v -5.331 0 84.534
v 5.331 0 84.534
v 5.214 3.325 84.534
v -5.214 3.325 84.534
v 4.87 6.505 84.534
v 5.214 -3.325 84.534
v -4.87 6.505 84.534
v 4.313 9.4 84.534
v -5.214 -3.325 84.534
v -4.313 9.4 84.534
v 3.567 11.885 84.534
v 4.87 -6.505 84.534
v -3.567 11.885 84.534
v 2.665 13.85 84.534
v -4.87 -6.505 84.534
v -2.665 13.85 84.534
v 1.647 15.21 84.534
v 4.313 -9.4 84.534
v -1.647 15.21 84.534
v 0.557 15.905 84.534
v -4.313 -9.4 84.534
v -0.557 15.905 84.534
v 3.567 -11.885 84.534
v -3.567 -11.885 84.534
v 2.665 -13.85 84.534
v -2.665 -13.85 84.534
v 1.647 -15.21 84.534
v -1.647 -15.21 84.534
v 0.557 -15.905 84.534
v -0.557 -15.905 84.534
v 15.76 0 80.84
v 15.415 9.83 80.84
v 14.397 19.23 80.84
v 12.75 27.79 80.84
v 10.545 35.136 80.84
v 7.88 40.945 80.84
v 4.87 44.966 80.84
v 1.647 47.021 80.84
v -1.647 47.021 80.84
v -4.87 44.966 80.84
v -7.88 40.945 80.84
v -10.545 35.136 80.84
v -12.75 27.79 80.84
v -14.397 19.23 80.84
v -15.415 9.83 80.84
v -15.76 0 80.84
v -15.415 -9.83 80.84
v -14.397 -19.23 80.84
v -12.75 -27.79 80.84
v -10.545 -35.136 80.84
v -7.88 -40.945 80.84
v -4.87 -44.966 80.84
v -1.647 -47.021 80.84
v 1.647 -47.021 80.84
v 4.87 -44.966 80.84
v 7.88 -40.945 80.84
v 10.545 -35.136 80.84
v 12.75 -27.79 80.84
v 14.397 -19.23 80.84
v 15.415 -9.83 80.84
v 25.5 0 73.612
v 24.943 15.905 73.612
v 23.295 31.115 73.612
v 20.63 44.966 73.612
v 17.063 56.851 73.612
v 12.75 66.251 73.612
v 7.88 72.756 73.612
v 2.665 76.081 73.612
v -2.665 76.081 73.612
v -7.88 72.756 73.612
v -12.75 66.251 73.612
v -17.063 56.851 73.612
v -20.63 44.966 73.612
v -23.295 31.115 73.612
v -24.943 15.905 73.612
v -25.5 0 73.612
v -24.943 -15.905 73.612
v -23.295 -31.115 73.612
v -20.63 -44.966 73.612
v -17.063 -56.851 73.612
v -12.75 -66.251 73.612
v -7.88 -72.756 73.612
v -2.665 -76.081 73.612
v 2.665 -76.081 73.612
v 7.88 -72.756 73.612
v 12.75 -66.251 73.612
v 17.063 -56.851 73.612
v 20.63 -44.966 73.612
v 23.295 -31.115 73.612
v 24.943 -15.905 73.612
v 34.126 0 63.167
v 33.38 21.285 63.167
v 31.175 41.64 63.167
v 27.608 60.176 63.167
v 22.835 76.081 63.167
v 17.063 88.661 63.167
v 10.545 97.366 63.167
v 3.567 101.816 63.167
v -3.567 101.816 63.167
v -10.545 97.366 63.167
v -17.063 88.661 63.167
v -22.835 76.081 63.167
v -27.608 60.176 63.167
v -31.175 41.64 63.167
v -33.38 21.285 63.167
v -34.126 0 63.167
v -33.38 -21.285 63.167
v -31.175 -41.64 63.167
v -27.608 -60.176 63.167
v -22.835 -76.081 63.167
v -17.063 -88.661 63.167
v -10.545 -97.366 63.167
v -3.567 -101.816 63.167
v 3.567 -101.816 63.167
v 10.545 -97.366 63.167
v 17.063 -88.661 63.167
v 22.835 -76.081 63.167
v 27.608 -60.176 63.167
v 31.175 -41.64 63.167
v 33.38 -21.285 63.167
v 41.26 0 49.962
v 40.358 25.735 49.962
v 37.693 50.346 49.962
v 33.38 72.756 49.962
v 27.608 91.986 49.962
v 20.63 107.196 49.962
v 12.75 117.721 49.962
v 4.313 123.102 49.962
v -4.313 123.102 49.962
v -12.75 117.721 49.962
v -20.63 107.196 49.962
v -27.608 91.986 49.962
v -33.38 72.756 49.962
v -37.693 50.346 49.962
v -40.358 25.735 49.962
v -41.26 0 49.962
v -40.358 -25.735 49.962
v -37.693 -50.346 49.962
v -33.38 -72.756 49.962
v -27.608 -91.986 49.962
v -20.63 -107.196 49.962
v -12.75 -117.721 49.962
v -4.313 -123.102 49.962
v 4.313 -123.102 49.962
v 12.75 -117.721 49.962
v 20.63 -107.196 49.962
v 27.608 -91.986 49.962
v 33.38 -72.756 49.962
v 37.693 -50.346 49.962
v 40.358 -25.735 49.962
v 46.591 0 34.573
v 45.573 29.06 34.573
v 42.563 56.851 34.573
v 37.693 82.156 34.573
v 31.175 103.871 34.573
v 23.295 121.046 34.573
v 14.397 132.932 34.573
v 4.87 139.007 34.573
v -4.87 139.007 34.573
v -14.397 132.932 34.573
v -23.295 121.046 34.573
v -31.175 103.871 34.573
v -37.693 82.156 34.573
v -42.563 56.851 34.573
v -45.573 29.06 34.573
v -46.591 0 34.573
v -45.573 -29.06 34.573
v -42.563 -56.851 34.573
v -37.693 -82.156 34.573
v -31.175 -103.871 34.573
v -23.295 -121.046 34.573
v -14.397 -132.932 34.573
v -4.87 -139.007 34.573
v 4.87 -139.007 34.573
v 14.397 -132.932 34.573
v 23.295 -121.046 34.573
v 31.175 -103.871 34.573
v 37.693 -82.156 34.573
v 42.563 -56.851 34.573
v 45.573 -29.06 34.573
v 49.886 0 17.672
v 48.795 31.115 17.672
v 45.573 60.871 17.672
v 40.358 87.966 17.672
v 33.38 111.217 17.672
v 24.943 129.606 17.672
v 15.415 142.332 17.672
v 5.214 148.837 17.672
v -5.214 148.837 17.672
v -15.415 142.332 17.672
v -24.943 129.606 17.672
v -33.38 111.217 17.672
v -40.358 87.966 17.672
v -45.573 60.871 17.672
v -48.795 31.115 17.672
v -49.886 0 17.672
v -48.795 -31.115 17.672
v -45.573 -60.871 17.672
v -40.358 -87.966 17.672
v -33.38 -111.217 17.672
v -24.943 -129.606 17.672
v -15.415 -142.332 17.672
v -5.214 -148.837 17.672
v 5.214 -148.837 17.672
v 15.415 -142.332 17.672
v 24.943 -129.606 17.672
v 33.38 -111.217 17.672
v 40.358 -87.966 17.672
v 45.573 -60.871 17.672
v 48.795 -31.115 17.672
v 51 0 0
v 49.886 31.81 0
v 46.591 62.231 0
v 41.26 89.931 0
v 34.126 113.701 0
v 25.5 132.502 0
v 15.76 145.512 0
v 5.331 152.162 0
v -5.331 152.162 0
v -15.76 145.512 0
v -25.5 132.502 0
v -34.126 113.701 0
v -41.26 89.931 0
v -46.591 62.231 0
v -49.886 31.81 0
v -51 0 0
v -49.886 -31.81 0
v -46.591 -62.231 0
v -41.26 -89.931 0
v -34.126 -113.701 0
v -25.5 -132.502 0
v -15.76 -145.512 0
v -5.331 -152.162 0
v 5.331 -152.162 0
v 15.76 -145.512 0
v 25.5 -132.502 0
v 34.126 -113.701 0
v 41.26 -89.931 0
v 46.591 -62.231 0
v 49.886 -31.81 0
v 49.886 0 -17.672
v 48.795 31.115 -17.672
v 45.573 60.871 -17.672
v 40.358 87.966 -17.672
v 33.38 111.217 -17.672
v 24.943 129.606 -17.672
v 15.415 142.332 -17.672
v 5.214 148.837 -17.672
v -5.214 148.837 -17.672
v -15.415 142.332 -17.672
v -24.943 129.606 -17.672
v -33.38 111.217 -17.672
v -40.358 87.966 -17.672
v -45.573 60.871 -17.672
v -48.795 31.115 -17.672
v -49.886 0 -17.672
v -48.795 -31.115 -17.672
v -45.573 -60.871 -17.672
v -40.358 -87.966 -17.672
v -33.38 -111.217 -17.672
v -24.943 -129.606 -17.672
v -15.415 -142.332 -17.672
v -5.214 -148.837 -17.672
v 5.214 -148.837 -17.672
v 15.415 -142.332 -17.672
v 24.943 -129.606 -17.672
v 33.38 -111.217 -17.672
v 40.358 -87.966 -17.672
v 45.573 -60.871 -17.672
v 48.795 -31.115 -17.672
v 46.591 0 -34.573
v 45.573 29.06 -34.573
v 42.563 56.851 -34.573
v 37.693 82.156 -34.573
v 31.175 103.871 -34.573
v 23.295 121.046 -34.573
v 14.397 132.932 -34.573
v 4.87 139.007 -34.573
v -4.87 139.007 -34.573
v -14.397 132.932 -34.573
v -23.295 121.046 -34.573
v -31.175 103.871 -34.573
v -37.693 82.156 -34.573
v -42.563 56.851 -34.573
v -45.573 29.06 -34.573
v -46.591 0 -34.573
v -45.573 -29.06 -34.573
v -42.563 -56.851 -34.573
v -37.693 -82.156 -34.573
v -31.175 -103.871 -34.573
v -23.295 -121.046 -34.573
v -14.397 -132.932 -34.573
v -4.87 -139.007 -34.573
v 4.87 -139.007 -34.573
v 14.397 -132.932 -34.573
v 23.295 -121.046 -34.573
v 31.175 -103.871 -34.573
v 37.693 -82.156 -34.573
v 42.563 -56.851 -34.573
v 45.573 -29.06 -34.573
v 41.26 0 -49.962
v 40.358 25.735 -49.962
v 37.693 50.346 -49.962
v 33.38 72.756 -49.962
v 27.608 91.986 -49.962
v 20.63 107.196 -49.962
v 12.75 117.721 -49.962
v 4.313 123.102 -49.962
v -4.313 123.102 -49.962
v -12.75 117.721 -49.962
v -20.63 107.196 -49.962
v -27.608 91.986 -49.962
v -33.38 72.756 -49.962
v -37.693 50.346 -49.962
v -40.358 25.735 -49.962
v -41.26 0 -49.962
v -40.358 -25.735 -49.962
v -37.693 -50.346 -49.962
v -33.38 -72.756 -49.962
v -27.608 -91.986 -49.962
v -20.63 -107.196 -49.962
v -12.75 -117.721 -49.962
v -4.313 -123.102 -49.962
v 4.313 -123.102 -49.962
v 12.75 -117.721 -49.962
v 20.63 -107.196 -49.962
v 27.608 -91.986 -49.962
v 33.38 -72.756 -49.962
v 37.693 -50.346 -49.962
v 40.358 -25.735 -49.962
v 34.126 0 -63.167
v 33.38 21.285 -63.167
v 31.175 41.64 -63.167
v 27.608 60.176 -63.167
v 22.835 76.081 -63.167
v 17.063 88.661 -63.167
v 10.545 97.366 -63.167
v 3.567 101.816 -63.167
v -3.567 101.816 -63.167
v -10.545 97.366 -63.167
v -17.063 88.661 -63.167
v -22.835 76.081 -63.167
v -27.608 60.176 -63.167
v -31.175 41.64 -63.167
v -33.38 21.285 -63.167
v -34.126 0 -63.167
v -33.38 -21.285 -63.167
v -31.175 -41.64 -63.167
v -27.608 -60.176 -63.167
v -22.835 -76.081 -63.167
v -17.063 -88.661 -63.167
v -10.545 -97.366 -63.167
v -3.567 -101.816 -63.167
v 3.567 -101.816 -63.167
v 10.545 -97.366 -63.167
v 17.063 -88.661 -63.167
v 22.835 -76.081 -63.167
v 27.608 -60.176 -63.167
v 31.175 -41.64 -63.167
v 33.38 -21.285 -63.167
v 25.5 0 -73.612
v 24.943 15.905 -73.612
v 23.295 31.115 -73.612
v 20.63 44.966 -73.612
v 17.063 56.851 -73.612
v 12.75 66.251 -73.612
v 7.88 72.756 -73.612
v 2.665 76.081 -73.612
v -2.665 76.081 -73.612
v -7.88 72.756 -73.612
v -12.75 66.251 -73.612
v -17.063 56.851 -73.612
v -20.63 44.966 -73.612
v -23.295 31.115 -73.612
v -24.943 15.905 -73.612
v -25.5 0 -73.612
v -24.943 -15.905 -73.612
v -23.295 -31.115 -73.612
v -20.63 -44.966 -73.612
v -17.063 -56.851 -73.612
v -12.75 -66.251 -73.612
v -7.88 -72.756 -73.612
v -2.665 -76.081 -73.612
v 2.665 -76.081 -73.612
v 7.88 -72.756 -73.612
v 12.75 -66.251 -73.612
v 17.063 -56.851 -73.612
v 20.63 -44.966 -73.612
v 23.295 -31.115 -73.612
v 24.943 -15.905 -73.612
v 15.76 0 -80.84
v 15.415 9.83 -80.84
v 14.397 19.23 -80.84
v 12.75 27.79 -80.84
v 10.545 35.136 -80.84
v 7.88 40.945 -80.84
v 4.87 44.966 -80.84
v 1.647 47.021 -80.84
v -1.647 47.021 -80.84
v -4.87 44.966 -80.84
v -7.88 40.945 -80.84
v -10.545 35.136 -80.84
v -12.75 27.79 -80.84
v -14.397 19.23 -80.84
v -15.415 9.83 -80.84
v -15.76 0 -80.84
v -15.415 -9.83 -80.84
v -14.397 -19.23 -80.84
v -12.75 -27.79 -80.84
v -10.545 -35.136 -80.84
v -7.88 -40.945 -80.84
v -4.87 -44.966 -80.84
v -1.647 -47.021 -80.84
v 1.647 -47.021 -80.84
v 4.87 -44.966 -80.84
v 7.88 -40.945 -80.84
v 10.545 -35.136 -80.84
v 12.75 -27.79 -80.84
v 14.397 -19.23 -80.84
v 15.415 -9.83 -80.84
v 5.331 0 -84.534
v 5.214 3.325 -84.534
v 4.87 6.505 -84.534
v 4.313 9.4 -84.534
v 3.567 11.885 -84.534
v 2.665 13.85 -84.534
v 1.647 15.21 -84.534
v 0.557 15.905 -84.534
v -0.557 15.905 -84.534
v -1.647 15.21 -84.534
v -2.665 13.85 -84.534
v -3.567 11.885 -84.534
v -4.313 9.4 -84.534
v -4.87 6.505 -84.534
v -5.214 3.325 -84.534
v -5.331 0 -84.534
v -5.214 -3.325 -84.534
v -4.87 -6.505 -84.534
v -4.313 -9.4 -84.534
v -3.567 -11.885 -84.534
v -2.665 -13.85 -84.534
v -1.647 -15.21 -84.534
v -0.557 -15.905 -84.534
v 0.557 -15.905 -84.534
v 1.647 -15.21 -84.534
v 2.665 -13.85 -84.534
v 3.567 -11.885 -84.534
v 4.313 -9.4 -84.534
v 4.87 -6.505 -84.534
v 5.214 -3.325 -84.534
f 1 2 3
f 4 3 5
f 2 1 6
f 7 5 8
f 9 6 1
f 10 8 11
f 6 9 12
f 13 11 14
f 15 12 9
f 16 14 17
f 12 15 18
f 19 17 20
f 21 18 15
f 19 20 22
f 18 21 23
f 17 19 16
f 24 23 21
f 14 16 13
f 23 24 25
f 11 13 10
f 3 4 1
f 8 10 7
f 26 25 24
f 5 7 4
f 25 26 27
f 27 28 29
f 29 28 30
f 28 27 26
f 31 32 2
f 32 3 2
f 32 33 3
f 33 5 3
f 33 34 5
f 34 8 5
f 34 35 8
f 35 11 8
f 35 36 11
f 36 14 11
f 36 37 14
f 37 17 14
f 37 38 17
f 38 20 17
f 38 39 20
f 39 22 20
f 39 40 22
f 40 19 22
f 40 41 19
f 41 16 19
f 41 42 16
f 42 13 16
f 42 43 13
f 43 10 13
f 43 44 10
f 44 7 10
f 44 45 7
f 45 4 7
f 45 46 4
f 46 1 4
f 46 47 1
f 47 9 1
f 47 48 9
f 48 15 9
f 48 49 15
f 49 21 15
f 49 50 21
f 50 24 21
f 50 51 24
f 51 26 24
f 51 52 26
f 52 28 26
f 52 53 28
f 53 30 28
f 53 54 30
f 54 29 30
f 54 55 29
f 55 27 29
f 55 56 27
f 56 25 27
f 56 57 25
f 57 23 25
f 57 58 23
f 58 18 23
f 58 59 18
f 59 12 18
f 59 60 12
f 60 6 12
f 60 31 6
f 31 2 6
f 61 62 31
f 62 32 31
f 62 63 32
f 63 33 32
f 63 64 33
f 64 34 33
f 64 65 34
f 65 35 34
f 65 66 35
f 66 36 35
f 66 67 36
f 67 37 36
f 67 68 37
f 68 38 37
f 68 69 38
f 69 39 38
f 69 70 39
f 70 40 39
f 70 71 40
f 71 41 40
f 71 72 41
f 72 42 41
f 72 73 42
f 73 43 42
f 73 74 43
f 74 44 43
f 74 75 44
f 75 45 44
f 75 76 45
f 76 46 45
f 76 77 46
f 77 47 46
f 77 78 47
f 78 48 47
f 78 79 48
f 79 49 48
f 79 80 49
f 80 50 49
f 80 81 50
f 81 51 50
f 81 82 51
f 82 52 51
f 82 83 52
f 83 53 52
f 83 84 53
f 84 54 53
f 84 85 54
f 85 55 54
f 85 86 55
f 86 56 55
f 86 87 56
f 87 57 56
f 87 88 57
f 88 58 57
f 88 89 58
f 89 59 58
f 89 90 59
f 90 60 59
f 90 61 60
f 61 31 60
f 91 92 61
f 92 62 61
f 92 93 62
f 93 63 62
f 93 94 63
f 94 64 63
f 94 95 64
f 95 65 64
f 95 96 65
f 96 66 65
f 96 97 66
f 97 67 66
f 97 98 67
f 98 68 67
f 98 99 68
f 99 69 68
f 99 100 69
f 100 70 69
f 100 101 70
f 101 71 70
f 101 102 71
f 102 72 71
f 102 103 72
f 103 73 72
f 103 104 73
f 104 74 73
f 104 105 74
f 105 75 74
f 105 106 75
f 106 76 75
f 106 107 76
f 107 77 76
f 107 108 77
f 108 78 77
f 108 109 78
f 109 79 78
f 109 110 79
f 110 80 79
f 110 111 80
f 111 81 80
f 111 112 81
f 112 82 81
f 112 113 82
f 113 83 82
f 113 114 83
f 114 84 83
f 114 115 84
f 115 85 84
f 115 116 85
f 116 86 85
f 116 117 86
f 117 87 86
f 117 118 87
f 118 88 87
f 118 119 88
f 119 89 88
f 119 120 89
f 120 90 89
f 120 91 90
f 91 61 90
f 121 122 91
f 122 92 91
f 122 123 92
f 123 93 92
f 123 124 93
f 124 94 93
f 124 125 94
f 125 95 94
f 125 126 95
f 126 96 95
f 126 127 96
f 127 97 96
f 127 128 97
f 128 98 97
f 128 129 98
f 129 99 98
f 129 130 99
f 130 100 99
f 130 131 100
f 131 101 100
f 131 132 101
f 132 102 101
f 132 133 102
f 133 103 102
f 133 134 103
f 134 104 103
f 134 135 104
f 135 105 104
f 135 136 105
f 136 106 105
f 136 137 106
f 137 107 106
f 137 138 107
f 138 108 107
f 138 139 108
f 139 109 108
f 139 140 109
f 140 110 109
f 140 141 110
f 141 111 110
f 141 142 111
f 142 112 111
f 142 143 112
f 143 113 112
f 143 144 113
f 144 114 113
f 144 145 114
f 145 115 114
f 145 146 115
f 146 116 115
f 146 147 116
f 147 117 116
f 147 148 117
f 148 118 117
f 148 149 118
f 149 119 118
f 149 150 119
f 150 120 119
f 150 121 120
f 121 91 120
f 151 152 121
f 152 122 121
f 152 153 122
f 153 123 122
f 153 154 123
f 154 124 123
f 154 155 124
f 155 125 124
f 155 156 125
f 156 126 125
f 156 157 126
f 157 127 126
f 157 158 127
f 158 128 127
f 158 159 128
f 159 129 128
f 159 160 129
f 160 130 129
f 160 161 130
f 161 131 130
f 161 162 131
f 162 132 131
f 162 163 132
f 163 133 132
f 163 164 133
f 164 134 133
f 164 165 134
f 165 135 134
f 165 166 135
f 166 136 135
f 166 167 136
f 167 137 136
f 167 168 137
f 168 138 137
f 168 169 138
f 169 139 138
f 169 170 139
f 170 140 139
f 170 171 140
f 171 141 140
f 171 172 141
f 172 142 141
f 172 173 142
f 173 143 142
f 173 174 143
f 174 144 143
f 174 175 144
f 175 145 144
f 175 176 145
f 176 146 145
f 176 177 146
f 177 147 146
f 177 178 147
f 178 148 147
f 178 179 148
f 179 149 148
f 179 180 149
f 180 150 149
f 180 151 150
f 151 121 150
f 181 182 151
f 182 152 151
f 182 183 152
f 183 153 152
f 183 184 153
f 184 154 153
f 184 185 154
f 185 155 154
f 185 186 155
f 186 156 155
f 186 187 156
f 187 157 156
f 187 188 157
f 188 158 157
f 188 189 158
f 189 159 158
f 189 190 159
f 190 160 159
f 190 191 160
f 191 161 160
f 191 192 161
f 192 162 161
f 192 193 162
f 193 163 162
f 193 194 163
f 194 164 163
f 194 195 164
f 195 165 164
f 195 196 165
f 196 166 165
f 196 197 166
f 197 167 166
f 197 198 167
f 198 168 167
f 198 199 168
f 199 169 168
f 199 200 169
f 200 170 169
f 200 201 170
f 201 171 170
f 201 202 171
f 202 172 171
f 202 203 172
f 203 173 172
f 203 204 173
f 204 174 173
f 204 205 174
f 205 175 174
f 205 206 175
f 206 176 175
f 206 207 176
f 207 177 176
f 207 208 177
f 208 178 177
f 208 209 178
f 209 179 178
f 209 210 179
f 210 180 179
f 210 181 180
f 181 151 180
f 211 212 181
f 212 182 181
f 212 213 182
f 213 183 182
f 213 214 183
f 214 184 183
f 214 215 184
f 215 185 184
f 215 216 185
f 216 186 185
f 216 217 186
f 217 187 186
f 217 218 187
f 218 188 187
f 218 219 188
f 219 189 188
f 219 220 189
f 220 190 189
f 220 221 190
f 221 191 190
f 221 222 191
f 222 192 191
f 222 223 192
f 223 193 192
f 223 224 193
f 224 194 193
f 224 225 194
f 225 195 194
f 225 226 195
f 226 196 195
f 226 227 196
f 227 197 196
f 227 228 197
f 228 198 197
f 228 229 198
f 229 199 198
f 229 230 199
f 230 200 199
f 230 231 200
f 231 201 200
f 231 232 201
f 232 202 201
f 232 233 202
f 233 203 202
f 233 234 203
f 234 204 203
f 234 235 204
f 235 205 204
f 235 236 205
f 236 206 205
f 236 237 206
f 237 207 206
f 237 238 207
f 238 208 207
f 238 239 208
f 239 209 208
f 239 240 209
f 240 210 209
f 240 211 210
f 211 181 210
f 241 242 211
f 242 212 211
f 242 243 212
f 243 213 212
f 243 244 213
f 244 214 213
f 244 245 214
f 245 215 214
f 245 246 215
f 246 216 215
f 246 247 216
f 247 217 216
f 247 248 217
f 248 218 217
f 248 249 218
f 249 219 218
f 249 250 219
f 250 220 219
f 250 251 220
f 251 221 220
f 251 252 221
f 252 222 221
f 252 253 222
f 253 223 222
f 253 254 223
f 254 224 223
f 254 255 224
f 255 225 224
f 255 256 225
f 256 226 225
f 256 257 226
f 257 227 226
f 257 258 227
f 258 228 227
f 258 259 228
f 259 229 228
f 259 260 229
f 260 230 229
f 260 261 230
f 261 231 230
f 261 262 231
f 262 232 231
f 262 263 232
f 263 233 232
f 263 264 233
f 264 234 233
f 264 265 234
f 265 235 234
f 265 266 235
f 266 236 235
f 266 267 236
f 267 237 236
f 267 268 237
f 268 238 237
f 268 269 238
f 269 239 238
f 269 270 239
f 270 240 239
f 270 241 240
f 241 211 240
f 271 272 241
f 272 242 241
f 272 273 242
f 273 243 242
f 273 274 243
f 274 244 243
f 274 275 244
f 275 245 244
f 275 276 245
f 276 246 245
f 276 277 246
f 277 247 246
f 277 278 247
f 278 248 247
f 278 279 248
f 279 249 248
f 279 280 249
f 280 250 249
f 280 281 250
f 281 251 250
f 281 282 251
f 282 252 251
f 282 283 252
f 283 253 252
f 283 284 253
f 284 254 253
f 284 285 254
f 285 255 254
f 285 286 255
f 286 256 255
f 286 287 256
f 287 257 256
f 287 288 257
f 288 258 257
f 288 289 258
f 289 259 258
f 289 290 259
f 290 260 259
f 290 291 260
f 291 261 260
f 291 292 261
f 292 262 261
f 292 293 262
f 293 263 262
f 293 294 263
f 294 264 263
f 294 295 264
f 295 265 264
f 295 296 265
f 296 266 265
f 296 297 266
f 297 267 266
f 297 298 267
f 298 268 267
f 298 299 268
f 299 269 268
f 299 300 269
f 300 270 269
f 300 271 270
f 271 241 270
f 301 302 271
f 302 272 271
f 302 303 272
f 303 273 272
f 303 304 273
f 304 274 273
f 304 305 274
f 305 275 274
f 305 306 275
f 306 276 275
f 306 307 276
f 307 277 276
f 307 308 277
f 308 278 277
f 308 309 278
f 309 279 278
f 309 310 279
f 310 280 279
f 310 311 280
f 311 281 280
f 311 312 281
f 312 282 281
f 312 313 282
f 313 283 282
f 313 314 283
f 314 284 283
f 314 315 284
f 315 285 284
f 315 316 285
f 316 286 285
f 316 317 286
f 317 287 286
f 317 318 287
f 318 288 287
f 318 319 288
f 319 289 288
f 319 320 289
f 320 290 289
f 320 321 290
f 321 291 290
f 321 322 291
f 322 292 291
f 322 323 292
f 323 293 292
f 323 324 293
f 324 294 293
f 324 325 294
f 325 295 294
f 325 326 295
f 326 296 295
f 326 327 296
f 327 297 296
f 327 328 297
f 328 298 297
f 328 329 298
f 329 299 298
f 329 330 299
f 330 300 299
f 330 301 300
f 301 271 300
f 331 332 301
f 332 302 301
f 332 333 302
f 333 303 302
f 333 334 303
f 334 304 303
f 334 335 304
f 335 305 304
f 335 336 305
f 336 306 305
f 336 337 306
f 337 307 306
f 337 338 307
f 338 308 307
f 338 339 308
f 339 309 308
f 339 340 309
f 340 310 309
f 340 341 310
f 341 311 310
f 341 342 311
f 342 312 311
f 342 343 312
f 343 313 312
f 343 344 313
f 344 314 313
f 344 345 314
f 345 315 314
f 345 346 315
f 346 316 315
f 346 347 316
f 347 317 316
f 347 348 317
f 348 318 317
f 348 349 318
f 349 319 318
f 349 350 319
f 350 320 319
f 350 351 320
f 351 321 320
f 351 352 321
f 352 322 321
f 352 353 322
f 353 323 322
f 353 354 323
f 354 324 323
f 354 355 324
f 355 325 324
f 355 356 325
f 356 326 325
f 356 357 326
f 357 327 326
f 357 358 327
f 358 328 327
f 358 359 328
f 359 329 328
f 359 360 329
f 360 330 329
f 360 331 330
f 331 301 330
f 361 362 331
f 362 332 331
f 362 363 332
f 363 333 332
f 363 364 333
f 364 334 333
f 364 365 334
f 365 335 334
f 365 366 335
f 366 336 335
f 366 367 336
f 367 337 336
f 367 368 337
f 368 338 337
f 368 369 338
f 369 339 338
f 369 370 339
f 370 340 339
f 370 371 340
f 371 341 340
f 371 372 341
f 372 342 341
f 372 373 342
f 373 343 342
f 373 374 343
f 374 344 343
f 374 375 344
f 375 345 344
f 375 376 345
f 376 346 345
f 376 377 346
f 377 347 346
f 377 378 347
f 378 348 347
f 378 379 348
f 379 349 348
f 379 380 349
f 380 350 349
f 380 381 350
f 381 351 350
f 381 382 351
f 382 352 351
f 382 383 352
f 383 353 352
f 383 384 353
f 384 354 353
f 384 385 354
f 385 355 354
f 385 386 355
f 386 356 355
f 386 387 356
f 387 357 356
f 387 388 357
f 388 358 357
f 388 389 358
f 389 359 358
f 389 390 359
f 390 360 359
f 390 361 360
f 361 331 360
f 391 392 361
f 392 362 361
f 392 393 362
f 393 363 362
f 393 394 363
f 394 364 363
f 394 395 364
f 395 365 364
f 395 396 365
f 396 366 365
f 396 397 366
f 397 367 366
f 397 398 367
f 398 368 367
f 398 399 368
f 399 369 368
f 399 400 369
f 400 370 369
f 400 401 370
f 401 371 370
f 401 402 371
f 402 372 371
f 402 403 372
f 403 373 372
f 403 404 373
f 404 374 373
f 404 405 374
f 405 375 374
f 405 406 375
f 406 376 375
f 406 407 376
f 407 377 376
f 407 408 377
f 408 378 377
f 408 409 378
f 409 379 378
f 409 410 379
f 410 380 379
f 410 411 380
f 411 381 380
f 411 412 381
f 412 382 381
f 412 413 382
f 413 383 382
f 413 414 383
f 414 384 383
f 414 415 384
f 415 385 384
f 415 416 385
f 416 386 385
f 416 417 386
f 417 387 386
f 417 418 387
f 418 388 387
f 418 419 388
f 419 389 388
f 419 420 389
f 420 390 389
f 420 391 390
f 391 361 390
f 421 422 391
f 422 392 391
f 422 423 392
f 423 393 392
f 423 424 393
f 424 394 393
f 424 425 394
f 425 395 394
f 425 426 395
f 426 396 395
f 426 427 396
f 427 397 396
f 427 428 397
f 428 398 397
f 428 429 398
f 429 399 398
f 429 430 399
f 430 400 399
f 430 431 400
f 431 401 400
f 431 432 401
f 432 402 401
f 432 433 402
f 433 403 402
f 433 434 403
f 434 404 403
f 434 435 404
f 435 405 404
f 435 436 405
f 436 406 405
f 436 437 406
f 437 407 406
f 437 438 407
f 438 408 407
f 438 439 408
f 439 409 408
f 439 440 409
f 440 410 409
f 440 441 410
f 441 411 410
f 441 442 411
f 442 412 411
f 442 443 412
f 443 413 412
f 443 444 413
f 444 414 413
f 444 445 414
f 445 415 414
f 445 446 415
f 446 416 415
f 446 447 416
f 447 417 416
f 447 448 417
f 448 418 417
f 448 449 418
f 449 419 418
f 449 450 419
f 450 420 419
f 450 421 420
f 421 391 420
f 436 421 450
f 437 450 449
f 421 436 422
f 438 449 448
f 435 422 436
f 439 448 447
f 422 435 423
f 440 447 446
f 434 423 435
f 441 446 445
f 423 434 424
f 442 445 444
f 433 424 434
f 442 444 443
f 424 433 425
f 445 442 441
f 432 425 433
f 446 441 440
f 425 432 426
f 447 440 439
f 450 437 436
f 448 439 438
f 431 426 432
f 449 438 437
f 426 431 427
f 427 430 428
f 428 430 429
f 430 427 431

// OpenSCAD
// Generated by SolidPython 1.0.1 on 2020-07-29 00:46:45


scale(v = [3, 9, 5]) {
	sphere(r = 17);
}
/***********************************************
*********      SolidPython code:      **********
************************************************
 
# import packages: SolidPython
from solid import *
from solid.utils import *
from itertools import chain, combinations, permutations


class Resize:

    def __init__(self, scad_file):
        self.scad_file = scad_file
        #self.scad_file = import_scad(scad_file)
        # cone/cylinder param:
        self.r1 = 0
        self.r2 = 0
        self.h = 0
        # rectangular prism param:
        self.w = 0
        self.l = 0
        # ellipse param:
        self.r = 0

    # import OpenScad code (file name corresponds to shape)


    # classify shape + parameters
    def assign(self, param1, param2, param3):
        if self.scad_file == 'cone.scad':
            self.r1 = param1
            self.r2 = param2
            self.h = param3
        elif self.scad_file == 'cylinder.scad':
            self.r1 = param1
            self.r2 = param2
            self.h = param3
        elif self.scad_file == 'rectangularPrism.scad':
            self.h = param1
            self.l = param2
            self.w = param3
        else:
            self.r = param1
            self.h = param2

    # resize parameters
    def iterate(self):
        x = range(3, 20, 2)
        i = 1
        if self.scad_file == 'cone.scad':
            tempList = list(permutations(x, 2))
            for temp in tempList:
                param1 = temp[0]
                param2 = temp[1]
                filepath = 'produced_scad_files/' + 'cone' + str(param1) + '_' + str(param2) + '_' + '.scad'
                scad_render_to_file(cylinder(h=param1, r1=param2, r2=0), filepath)

        elif self.scad_file == 'cylinder.scad':
            tempList = list(permutations(x, 3))
            for temp in tempList:
                param1 = temp[0]
                param2 = temp[1]
                filepath = 'produced_scad_files/' + 'cylinder' + str(param1) + '_' + str(param2) + '_' + '.scad'
                scad_render_to_file(cylinder(h=param1, r1=param2, r2=param2), filepath)

        elif self.scad_file == 'rectangularPrism.scad':
            tempList = list(permutations(x, 3))
            for temp in tempList:
                param1 = temp[0]
                param2 = temp[1]
                param3 = temp[2]
                filepath = 'produced_scad_files/' + 'rectangularPrism' + str(param1) + '_' + str(param2) + '_' + str(
                    param3) + '.scad'
                scad_render_to_file(cube(size=(param1, param2, param3)), filepath)

        elif self.scad_file == 'ellipse.scad':
            tempList = list(permutations(x, 4))
            for temp in tempList:
                param1 = temp[0]
                param2 = temp[1]
                param3 = temp[2]
                param4 = temp[3]
                filepath = 'produced_scad_files/' + 'ellipse' + str(param1) + '_' + str(param2) + '_' + str(param3) + '_' + str(param4) + '.scad'
                scad_render_to_file(scale([param1, param2, param3])(sphere(r=param4)), filepath)

    def render_to_scadfile(self):
        scad_render_to_file(scad, 'example.scad') 
 
************************************************/
